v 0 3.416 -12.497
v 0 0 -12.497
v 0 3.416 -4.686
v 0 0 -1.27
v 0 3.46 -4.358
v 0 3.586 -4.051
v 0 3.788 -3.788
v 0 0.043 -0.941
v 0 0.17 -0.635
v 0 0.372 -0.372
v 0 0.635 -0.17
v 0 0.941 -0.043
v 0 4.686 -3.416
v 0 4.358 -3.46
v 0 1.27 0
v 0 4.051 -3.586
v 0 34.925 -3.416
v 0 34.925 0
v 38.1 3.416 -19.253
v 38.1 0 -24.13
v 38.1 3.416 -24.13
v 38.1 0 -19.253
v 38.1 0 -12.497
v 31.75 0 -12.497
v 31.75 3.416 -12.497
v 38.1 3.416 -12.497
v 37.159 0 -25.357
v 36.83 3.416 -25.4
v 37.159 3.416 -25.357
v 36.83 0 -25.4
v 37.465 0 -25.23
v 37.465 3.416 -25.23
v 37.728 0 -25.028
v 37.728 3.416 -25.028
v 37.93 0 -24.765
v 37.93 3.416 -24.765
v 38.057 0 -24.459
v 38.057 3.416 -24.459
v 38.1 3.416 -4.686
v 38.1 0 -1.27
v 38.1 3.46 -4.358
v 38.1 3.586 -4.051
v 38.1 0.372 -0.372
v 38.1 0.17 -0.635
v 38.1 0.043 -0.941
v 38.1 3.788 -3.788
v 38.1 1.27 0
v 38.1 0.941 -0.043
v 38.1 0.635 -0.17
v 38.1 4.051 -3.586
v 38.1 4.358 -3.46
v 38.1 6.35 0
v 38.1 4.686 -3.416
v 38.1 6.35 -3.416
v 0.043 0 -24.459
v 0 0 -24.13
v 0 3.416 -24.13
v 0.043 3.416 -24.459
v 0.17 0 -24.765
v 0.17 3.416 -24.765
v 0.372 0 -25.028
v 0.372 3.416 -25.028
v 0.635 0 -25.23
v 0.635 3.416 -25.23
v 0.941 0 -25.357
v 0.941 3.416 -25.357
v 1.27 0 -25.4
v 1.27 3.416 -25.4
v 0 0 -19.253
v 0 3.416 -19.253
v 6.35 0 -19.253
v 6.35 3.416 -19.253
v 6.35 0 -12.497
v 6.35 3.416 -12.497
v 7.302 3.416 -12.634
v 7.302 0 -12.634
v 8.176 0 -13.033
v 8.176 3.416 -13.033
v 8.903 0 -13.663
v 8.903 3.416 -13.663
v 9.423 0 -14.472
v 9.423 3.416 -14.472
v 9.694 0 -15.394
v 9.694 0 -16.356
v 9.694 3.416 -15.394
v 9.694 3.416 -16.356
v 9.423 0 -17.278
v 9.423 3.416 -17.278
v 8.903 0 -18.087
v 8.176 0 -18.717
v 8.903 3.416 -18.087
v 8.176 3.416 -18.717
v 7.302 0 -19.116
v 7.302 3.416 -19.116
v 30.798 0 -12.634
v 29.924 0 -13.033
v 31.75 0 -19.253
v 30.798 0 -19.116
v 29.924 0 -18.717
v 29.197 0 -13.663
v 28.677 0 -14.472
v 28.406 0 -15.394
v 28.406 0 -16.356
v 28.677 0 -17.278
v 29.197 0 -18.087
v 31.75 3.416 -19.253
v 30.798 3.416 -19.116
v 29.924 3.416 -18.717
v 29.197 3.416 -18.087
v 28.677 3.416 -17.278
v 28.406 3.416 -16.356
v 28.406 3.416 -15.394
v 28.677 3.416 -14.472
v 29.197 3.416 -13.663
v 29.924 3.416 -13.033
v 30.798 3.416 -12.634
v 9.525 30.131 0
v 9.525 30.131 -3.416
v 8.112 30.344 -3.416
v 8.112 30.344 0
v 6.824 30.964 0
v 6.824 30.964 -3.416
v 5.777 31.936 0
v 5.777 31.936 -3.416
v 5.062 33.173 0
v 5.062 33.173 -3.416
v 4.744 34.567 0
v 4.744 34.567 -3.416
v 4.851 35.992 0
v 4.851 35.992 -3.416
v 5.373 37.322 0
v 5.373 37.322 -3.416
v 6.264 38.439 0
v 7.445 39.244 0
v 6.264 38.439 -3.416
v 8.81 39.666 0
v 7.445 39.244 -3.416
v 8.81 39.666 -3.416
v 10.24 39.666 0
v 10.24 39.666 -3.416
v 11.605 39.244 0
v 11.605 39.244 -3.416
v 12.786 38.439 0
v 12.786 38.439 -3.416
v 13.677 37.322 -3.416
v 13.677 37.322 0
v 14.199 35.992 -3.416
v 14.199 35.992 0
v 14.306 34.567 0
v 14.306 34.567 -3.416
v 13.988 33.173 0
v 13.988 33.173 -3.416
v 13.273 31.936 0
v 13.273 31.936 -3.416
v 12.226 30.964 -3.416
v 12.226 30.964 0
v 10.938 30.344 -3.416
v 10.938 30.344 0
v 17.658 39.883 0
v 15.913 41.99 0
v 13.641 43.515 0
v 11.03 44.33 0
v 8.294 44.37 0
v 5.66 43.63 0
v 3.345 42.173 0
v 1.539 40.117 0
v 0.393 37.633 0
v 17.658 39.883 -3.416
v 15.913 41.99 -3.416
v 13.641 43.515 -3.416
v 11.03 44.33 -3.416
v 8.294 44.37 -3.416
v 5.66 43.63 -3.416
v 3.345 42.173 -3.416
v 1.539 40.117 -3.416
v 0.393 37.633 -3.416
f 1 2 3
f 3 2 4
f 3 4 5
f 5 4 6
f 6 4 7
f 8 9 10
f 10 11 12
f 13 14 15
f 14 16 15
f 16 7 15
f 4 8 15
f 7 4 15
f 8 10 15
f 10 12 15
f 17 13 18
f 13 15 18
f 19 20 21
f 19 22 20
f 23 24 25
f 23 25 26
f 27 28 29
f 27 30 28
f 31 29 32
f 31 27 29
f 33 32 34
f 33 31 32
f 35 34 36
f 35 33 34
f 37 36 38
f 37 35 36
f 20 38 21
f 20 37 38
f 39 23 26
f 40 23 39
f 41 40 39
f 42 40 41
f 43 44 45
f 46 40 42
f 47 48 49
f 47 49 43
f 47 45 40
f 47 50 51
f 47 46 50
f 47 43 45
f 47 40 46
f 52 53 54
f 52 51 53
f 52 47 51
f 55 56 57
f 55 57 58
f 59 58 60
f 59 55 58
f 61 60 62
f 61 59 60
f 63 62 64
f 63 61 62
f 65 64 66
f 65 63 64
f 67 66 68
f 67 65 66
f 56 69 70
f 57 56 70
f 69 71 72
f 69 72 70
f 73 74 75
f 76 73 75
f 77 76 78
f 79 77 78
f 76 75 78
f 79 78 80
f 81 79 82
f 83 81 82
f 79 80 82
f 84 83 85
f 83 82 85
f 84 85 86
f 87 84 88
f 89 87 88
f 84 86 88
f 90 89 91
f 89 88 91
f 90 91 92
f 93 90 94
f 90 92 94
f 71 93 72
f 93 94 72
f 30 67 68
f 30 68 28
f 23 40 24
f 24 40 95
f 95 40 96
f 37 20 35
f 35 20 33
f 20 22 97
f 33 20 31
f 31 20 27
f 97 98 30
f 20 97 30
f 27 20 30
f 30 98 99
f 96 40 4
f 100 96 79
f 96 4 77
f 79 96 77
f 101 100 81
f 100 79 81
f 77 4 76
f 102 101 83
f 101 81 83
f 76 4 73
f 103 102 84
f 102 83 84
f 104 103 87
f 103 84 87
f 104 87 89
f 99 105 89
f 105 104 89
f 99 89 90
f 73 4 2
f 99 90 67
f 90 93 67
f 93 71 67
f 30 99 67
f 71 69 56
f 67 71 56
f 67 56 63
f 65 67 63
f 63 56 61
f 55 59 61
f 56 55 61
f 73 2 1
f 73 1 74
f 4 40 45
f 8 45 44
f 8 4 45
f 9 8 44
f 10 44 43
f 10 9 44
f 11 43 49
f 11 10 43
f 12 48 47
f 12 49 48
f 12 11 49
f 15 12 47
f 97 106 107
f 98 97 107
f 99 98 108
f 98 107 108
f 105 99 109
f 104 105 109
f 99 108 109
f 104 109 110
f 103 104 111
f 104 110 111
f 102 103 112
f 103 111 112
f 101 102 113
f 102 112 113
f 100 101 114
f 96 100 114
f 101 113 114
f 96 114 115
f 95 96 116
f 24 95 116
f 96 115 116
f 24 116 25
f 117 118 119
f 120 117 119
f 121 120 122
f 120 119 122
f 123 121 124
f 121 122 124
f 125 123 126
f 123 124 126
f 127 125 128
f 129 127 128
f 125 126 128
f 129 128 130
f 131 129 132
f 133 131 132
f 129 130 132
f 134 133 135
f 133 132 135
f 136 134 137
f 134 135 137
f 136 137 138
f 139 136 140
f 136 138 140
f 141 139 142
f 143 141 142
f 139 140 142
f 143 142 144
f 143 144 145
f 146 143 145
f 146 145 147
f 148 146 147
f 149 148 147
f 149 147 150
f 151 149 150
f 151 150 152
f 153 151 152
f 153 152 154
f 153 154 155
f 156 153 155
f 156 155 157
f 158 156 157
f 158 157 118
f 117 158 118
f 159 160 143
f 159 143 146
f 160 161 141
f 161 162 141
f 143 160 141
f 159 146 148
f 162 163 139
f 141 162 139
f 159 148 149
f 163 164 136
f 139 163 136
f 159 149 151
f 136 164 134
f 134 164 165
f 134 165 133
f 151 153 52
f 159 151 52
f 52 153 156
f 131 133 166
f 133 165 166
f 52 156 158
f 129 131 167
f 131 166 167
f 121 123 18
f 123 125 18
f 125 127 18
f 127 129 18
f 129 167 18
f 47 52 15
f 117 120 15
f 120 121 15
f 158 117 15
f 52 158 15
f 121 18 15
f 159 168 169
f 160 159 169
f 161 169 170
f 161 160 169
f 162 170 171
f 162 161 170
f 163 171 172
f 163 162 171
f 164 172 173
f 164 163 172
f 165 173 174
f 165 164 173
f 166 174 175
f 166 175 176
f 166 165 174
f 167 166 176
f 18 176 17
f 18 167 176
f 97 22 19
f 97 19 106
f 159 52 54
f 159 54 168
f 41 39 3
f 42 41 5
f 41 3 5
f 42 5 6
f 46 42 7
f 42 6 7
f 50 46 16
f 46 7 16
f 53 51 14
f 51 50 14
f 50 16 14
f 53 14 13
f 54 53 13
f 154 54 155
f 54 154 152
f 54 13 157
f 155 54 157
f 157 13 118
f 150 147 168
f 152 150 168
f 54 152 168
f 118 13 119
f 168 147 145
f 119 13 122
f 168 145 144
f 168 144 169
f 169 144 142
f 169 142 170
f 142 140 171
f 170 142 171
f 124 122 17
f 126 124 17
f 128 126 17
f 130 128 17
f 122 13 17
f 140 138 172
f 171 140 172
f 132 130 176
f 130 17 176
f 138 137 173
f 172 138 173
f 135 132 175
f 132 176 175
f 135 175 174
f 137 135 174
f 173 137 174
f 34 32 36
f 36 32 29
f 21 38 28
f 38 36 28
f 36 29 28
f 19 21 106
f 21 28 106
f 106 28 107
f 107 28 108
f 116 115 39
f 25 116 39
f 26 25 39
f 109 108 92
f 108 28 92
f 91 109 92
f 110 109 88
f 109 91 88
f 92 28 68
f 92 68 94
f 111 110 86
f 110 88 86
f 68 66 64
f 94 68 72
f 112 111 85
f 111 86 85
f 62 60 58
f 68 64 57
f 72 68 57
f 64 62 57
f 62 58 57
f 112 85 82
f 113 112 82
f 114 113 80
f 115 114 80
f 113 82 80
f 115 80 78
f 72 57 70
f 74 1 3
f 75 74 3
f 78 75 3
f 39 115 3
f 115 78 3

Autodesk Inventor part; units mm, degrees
sketch "Sketch_1" plane through (0, 0, 0) normal (1, 0, 0) x (0, 1, 0)
  line L0 (44.45, 0) -> (1.27, 0)
  arc A0 (1.27, 0) -> (0, -1.27) centre (1.27, -1.27) ccw
  line L1 (0, -1.27) -> (0, -25.4)
  line L2 (0, -25.4) -> (3.4163, -25.4)
  line L3 (3.4163, -25.4) -> (3.4163, -4.6863)
  arc A1 (4.6863, -3.4163) -> (3.4163, -4.6863) centre (4.6863, -4.6863) ccw
  line L4 (4.6863, -3.4163) -> (44.45, -3.4163)
  line L5 (44.45, -3.4163) -> (44.45, 0)
extrude "Extrusion1" add sketch "Sketch_1" along normal blind 38.1
sketch "Sketch_2" plane through (0, 0, 0) normal (0, 0, 1) x (1, 0, 0)
  line L0 (-38.1, -44.45) -> (57.15, -44.45)
  line L1 (57.15, -44.45) -> (57.15, 66.675)
  line L2 (57.15, 66.675) -> (-38.1, 66.675)
  line L3 (-38.1, 66.675) -> (-38.1, -44.45)
  line L4 (0, 0) -> (38.1, 0)
  line L5 (38.1, 0) -> (38.1, 6.35)
  line L6 (38.1, 6.35) -> (17.6579, 39.8829)
  arc A0 (17.6579, 39.8829) -> (0, 34.925) centre (9.525, 34.925) ccw
  line L7 (0, 34.925) -> (0, 0)
extrude "Extrusion2" cut sketch "Sketch_2" against normal blind 25.4
sketch "Sketch3" plane through (0, 1.27, 0) normal (0, 0, 1) x (1, 0, 0)
  point P0 (9.525, 33.655)
hole "Hole1" at (9.525, 34.925, 0) direction (0, 0, -1) diameter 9.5885 depth 3.4163
sketch "Sketch4" plane through (0, 0, -25.4) normal (0, -1, 0) x (1, 0, 0)
  point P0 (6.35, 9.525)
hole "Hole2" at (6.35, 0, -15.875) direction (0, 1, 0) diameter 6.7564 depth 3.4163
sketch "Sketch5" plane through (0, 0, -25.4) normal (0, -1, 0) x (1, 0, 0)
  point P0 (31.75, 9.525)
hole "Hole3" at (31.75, 0, -15.875) direction (0, 1, 0) diameter 6.7564 depth 3.4163
sketch "Sketch_6" plane through (0, 0, 0) normal (0, 1, 0) x (-1, 0, 0)
  line L0 (0, -19.2532) -> (0, -12.4968)
  line L1 (0, -12.4968) -> (-6.35, -12.4968)
  line L2 (-6.35, -12.4968) -> (-6.35, -19.2532)
  line L3 (-6.35, -19.2532) -> (0, -19.2532)
sketch "Sketch_7" plane through (0, 0, 0) normal (0, 1, 0) x (-1, 0, 0)
  line L0 (-31.75, -19.2532) -> (-31.75, -12.4968)
  line L1 (-31.75, -12.4968) -> (-38.1, -12.4968)
  line L2 (-38.1, -12.4968) -> (-38.1, -19.2532)
  line L3 (-38.1, -19.2532) -> (-31.75, -19.2532)
extrude "Extrusion3" cut sketch "Sketch_6" along normal blind 3.4163
extrude "Extrusion4" cut sketch "Sketch_7" along normal blind 3.4163
sketch "Sketch_8" plane through (0, 0, 0) normal (0, 1, 0) x (-1, 0, 0)
  line L0 (0, -38.1) -> (0, -24.13)
  arc A0 (-1.27, -25.4) -> (0, -24.13) centre (-1.27, -24.13) ccw
  line L1 (-1.27, -25.4) -> (-36.83, -25.4)
  arc A1 (-38.1, -24.13) -> (-36.83, -25.4) centre (-36.83, -24.13) ccw
  line L2 (-38.1, -24.13) -> (-38.1, -38.1)
  line L3 (-38.1, -38.1) -> (0, -38.1)
extrude "Extrusion5" cut sketch "Sketch_8" along normal blind 3.4163
ref_plane "to_dummy_R_XY" through (0, 0, 0) normal (0, 0, 1) x (1, 0, 0)
ref_plane "to_dummy_R_YZ" through (0, 0, 0) normal (1, 0, 0) x (0, 1, 0)
ref_plane "to_dummy_R_ZX" through (0, 0, 0) normal (0, 1, 0) x (0, 0, 1)
ref_plane "to_pin_R_XY" through (9.525, 34.925, 0) normal (0, 0, 1) x (1, 0, 0)
ref_plane "to_pin_R_YZ" through (9.525, 34.925, 0) normal (1, 0, 0) x (0, 1, 0)
ref_plane "to_pin_R_ZX" through (9.525, 34.925, 0) normal (0, 1, 0) x (0, 0, 1)
properties part number "D-14826" material "Steel"
